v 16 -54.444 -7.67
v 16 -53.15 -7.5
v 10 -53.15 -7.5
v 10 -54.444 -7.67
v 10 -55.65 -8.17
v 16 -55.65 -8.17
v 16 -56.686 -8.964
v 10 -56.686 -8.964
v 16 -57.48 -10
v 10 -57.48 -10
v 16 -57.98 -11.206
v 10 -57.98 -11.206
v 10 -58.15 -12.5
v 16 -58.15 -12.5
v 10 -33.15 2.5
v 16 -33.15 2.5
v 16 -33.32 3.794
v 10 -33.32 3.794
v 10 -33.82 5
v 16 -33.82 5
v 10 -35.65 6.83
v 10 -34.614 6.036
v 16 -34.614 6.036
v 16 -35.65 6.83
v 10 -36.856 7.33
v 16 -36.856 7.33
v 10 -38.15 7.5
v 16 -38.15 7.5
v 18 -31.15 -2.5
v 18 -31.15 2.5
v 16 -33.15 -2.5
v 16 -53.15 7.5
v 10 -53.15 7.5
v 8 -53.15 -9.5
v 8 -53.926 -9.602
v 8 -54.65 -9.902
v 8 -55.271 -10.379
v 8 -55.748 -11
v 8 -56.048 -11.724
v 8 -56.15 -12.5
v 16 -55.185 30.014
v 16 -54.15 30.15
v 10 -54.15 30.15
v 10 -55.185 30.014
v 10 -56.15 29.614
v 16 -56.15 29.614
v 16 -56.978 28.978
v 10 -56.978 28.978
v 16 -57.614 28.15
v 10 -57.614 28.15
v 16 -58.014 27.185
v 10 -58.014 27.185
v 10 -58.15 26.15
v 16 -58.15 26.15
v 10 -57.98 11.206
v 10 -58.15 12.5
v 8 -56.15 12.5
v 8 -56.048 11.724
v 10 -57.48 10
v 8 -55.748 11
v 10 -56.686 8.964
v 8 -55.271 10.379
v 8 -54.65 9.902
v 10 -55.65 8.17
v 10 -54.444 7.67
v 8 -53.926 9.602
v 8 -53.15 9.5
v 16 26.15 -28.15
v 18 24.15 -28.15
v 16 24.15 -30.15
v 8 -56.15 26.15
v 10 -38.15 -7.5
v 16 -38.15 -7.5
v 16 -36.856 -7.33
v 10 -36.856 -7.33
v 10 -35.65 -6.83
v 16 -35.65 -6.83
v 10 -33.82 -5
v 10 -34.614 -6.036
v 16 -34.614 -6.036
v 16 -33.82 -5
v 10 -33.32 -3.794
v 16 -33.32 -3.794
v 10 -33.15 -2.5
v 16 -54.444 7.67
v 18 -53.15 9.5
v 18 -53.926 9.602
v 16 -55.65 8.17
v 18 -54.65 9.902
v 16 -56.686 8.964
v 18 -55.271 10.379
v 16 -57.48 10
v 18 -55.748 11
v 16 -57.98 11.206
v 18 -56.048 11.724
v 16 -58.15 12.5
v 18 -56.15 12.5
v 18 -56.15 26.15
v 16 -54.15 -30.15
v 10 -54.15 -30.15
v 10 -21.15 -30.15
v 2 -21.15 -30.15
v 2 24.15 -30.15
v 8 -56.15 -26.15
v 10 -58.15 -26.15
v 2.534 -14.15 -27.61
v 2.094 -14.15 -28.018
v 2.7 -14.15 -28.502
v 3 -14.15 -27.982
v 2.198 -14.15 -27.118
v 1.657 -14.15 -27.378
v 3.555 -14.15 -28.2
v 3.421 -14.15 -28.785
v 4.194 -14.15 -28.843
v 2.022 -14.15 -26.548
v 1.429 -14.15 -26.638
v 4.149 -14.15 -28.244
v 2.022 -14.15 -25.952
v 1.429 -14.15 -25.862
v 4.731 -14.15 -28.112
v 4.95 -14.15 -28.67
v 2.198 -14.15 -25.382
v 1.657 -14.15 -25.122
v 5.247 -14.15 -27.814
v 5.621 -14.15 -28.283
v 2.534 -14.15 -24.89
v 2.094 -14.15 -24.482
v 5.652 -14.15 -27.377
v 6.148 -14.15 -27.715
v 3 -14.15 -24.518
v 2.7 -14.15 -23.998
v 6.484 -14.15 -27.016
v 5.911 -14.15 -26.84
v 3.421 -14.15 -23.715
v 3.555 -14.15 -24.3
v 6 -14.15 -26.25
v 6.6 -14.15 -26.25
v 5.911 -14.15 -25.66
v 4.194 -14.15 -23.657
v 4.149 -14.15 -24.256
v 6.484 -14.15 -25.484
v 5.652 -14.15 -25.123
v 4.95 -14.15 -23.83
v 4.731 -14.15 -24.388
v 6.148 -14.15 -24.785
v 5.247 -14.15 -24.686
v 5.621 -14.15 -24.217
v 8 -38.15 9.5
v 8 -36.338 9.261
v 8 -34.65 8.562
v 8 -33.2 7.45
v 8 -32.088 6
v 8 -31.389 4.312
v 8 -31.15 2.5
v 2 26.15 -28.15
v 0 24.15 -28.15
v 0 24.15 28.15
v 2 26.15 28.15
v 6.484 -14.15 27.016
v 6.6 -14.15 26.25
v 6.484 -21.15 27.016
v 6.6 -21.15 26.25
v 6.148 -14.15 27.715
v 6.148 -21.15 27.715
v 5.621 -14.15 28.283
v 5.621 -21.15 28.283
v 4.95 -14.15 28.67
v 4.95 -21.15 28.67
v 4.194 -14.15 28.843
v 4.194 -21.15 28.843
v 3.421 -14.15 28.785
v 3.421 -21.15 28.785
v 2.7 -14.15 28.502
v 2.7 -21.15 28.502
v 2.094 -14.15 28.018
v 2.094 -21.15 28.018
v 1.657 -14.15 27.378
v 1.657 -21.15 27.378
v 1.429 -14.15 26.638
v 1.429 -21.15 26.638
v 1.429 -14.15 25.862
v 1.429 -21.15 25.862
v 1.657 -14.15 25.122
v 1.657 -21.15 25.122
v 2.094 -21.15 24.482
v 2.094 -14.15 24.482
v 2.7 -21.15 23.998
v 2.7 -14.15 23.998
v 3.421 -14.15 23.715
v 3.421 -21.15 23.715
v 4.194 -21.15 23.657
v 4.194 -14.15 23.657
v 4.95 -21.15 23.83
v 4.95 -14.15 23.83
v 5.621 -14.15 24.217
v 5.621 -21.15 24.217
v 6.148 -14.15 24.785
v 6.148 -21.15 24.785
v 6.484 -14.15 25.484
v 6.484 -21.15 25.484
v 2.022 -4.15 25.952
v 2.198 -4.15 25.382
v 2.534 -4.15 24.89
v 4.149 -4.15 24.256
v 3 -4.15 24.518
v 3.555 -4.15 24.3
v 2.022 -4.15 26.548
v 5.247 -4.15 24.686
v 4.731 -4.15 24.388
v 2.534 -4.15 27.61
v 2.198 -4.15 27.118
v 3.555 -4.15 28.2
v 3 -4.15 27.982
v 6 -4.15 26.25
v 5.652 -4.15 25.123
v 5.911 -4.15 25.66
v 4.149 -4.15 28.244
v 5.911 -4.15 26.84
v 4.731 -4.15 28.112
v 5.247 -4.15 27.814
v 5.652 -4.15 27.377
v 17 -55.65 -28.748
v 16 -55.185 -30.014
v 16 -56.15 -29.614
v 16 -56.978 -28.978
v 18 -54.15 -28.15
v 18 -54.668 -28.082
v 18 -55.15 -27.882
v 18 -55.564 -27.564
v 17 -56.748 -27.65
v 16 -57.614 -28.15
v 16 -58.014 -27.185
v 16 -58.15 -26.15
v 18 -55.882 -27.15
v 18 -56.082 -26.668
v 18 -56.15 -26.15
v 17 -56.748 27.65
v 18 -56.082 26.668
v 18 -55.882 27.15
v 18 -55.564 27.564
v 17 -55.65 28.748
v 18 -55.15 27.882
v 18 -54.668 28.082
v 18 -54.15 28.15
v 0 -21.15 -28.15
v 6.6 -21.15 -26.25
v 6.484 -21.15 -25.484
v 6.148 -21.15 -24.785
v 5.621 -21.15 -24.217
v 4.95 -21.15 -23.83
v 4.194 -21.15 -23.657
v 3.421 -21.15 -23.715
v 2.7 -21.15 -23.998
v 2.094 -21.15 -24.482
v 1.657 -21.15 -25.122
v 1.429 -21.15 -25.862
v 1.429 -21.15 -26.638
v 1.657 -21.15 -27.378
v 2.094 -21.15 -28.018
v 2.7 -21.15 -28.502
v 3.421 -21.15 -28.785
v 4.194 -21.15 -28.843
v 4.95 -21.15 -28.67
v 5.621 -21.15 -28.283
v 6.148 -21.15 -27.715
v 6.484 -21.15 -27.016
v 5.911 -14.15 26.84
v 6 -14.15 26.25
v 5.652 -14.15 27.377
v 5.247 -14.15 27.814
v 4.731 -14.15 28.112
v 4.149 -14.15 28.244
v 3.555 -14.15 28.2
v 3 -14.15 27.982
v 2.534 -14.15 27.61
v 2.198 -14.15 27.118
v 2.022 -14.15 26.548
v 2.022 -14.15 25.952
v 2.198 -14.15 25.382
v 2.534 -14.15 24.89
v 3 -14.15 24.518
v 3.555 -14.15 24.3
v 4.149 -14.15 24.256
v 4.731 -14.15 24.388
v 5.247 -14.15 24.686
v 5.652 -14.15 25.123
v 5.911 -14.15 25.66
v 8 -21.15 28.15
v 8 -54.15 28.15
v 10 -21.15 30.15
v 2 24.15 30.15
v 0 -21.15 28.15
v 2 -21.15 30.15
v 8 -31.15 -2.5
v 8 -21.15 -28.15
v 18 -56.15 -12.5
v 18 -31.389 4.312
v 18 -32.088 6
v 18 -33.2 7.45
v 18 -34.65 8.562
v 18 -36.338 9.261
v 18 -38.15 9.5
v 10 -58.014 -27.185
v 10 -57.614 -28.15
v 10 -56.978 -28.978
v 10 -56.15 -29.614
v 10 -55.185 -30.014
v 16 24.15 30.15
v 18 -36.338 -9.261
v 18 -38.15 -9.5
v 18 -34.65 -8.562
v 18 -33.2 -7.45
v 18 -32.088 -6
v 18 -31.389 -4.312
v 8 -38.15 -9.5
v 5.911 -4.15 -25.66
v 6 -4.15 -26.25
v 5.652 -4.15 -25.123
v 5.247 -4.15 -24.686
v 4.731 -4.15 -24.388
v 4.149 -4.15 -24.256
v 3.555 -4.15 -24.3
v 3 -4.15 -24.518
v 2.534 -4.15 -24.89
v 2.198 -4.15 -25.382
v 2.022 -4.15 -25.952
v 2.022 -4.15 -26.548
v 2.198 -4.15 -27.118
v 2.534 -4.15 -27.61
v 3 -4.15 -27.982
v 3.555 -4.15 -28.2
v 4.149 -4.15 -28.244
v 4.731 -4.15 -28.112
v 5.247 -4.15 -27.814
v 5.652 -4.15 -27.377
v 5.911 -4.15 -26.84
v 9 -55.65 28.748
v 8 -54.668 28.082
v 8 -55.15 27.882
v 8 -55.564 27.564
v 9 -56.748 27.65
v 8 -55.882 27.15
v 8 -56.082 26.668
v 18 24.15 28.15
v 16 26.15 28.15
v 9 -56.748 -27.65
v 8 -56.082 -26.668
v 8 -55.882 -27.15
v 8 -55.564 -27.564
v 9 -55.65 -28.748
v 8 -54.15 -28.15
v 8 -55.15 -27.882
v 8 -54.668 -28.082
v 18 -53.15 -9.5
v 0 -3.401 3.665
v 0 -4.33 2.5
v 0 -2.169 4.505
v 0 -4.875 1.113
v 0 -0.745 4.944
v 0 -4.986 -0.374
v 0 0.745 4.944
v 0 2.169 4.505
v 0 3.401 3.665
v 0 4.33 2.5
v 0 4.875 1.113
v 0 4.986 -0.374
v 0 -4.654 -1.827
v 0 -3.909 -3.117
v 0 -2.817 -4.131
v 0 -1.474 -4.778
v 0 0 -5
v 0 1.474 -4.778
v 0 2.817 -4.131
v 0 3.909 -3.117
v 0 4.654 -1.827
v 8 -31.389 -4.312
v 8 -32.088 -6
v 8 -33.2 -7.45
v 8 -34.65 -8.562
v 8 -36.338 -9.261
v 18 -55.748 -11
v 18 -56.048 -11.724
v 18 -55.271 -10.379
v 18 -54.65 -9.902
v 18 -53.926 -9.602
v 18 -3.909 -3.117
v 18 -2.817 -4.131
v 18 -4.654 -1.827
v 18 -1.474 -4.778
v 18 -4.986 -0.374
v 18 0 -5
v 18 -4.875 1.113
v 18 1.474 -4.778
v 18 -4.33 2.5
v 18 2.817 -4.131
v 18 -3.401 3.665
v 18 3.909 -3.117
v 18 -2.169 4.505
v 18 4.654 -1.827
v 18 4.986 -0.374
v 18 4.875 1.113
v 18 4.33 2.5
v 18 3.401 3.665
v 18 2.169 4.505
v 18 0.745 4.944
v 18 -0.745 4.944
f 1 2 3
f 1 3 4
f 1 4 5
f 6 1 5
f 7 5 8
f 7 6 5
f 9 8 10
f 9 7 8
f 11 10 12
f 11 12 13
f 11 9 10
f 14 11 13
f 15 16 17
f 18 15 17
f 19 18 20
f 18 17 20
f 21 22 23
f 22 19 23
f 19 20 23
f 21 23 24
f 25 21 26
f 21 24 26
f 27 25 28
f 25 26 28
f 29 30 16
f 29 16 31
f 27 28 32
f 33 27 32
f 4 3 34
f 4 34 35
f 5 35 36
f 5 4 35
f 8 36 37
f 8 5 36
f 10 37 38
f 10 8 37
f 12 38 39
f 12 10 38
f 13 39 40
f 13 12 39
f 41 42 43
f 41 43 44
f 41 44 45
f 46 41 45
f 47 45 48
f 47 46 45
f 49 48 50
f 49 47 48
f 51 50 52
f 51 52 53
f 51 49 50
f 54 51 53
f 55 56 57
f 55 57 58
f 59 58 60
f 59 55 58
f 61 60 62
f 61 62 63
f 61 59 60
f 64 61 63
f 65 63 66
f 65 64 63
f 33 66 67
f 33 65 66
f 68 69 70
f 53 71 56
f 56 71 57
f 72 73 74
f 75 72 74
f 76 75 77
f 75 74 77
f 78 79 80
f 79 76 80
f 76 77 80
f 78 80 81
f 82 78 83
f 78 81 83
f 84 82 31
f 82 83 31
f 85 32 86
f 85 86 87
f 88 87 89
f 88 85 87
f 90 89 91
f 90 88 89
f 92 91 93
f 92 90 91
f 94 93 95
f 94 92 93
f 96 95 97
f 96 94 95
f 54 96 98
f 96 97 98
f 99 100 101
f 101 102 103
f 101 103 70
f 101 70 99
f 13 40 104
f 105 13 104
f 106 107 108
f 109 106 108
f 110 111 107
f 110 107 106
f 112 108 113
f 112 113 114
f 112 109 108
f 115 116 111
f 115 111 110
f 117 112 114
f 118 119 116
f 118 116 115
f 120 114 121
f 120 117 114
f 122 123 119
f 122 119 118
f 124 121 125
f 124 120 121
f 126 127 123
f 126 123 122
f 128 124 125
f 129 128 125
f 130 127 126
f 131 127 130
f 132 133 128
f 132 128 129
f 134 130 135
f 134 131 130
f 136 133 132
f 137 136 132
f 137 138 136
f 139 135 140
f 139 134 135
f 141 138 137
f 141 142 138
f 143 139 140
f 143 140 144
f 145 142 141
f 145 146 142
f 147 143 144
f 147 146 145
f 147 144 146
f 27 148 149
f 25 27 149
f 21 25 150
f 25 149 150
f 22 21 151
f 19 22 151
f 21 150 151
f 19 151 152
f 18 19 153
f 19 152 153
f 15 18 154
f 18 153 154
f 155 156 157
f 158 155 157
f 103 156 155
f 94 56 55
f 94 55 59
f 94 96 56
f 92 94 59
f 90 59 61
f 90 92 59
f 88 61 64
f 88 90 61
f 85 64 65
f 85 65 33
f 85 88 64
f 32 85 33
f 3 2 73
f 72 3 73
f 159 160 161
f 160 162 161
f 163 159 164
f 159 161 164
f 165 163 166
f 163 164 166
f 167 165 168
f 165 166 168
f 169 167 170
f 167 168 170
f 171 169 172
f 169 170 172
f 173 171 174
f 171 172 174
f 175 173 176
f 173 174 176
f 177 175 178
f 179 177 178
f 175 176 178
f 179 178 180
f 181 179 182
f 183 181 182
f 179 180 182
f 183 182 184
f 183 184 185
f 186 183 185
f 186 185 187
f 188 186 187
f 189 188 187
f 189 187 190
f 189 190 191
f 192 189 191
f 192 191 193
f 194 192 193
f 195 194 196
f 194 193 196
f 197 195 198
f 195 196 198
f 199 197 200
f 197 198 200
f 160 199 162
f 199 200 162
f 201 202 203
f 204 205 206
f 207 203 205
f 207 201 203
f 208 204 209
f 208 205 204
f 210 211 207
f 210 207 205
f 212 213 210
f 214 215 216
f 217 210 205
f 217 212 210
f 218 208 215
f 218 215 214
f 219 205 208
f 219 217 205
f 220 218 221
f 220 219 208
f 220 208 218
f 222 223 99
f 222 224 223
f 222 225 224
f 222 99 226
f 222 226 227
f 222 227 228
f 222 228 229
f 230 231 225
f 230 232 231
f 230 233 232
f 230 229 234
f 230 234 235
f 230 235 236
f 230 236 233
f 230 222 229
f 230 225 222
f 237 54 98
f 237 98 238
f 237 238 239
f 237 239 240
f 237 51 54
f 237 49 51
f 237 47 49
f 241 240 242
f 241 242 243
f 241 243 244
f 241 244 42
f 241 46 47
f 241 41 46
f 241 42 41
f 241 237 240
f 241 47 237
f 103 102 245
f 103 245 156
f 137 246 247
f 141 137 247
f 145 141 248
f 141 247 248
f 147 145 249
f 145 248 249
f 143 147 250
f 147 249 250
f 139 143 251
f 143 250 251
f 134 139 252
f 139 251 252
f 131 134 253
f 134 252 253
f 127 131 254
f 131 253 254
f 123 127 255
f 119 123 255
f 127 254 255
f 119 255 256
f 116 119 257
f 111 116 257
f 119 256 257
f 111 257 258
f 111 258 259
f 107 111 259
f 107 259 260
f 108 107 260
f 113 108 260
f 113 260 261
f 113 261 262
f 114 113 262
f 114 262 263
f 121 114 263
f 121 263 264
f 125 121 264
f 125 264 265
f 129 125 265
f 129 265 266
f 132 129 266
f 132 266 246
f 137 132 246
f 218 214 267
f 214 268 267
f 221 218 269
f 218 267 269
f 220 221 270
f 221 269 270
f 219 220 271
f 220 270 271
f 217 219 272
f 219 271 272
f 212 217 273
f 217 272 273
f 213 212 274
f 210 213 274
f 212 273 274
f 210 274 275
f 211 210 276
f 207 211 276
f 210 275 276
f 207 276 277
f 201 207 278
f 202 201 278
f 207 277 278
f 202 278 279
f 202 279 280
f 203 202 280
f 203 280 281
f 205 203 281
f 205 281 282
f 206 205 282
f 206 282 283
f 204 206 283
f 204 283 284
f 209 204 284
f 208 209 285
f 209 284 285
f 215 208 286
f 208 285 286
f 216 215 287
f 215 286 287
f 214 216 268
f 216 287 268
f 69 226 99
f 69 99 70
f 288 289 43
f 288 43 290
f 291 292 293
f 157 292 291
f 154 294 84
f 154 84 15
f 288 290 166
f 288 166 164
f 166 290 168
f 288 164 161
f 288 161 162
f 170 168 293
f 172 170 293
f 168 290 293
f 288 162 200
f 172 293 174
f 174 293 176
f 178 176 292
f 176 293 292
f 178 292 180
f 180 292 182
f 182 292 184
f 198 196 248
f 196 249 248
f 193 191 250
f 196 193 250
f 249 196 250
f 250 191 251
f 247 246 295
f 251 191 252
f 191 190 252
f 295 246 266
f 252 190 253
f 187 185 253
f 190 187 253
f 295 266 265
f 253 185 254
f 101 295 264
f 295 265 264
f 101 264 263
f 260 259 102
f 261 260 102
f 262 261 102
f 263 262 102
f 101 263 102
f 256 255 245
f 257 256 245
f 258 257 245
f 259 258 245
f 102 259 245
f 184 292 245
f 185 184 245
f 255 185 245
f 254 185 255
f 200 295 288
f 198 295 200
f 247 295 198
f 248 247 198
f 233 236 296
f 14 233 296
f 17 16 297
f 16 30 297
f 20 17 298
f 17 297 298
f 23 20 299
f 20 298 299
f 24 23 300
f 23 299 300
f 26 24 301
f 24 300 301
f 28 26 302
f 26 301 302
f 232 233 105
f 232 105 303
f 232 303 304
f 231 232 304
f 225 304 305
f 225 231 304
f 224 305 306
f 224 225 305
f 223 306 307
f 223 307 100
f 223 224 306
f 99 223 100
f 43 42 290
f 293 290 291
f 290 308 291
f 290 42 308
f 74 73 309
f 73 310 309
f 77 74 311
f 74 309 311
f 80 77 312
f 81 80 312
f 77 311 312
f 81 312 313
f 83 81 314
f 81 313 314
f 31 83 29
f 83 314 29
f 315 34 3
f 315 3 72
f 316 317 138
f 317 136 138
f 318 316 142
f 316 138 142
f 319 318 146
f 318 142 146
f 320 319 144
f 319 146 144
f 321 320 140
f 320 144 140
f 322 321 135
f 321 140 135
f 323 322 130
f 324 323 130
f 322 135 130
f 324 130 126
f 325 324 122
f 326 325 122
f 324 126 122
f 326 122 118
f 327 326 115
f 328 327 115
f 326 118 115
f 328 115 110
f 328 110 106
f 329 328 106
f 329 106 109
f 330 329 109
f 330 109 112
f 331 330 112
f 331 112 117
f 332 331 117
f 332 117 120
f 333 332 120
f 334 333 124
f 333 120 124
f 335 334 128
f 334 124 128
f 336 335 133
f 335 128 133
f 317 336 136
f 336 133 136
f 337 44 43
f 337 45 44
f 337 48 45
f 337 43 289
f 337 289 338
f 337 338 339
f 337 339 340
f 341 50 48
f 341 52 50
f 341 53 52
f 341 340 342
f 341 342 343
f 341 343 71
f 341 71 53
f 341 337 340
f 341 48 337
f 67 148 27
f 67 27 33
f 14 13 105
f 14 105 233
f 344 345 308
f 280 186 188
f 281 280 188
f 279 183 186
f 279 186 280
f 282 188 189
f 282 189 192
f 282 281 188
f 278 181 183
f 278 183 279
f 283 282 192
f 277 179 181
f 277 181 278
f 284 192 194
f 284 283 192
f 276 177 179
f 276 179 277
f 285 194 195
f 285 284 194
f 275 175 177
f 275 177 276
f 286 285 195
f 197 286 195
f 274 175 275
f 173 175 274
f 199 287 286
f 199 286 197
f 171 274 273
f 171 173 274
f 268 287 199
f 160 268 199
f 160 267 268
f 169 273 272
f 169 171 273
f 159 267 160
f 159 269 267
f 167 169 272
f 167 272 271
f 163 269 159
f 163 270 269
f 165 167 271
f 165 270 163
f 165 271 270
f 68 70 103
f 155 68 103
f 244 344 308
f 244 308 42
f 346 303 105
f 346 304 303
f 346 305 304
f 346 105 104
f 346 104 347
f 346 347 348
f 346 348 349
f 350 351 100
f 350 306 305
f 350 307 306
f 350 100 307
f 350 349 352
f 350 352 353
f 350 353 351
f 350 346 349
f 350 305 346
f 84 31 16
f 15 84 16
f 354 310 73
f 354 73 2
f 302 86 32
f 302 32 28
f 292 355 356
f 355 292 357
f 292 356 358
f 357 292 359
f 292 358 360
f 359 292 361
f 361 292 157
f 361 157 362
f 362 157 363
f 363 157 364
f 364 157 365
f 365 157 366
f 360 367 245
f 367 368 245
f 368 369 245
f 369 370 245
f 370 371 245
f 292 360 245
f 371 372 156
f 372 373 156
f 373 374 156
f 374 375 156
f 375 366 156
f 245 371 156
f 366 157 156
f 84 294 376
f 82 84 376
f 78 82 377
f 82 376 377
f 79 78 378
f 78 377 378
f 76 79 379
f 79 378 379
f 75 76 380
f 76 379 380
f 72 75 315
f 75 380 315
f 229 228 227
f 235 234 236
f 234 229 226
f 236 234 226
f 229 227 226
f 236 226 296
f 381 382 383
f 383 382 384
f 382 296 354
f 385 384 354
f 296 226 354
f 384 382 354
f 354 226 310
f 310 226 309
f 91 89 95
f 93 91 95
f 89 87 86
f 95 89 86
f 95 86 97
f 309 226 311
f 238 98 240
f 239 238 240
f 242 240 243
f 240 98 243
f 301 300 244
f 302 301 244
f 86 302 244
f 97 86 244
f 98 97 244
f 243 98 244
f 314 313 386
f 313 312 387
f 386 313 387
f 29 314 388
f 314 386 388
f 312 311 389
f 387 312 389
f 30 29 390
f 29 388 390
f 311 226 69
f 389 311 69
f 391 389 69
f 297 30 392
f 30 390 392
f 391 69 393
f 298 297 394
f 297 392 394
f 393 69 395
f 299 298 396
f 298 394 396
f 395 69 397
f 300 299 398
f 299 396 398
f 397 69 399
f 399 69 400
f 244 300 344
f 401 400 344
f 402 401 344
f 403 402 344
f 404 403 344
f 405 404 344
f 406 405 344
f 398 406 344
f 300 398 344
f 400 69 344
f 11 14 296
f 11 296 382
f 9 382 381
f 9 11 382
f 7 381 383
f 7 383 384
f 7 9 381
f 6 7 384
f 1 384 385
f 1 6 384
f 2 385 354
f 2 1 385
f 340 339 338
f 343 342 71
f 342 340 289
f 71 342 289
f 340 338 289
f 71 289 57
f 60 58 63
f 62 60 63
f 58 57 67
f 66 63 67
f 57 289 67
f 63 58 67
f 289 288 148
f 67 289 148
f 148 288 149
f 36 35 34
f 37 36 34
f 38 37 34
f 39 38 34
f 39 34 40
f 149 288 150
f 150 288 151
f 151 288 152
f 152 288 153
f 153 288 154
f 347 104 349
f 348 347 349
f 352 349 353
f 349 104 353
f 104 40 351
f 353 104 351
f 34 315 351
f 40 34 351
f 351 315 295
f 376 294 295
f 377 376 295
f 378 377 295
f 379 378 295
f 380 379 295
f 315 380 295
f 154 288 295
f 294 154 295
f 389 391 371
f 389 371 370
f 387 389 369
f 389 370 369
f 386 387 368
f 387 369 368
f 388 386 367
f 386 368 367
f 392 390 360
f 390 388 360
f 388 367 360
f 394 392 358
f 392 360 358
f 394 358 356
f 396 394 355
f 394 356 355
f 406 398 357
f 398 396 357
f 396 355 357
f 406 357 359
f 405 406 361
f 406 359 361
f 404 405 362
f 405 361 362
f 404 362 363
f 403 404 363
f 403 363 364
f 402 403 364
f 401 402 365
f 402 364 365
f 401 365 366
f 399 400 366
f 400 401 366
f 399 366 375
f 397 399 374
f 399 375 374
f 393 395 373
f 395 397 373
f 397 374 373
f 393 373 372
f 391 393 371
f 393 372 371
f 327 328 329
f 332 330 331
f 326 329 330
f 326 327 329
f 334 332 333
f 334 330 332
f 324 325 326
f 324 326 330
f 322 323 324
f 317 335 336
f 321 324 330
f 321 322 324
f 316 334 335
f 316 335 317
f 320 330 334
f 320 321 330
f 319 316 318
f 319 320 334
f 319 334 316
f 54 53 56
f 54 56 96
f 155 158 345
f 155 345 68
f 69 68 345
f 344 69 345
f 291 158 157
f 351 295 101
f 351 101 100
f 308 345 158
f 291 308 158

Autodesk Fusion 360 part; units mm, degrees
sketch "Sketch1" plane through (0, 0, 0) normal (1, 0, 0) x (0, 0, -1)
  circle A0 centre (0, 0) radius 5
  line L0 (-30.15, -21.15) -> (30.15, -21.15)
  line L1 (30.15, -21.15) -> (30.15, 21.15)
  line L2 (-30.15, -21.15) -> (-30.15, 26.15)
  line L3 (-30.15, 26.15) -> (30.15, 26.15)
  line L4 (30.15, 26.15) -> (30.15, 21.15)
  dimension "d11" = 10
  dimension "d127" = 60.3
  dimension "d142" = 21.15
  dimension "d143" = 30.15
extrude "Extrude1" add sketch "Sketch1" along normal blind 8
sketch "Sketch16" plane through (0, -21.15, 0) normal (0, -1, 0) x (1, 0, 0)
  line L0 (0, 30.15) -> (0, -30.15)
  line L1 (0, -30.15) -> (8, -30.15)
  line L2 (8, -30.15) -> (8, 30.15)
  line L3 (8, 30.15) -> (0, 30.15)
  line L4 (4, 26.25) -> (4, -26.25) construction
  circle A0 centre (4, 26.25) radius 2.6
  circle A1 centre (4, -26.25) radius 2.6
  dimension "d144" = 4
  dimension "d145" = 52.5
  dimension "d146" = 5.2
  dimension "d147" = 5.2
  dimension "d148" = 26.25
extrude "Extrude17" cut sketch "Sketch16" against normal blind 7 contours A0 | A1
sketch "Sketch17" plane through (0, -14.15, 0) normal (0, -1, 0) x (1, 0, 0)
  circle A0 centre (4, 26.25) radius 2.6
  line L0 (4, 26.25) -> (4, -26.25)
  circle A1 centre (4, 26.25) radius 2
  circle A2 centre (4, -26.25) radius 2
  dimension "d151" = 52.5
  dimension "d152" = 4
  dimension "d153" = 4
extrude "Extrude18" cut sketch "Sketch17" against normal blind 10 contours A1 | A2
extrude "Extrude19" add 1 faces at (8, 1.9151, -21.7481) along direction (1, 0, 0) blind 10
sketch "Sketch18" plane through (0, -21.15, 0) normal (0, -1, 0) x (1, 0, 0)
  circle A0 centre (4, 26.25) radius 2.6
  circle A1 centre (4, -26.25) radius 2.6
  line L0 (0, 30.15) -> (0, -30.15)
  line L1 (0, -30.15) -> (18, -30.15)
  line L2 (18, -30.15) -> (18, 30.15)
  line L3 (18, 30.15) -> (0, 30.15)
  line L4 (18, 30.15) -> (8, 30.15)
  line L5 (8, 30.15) -> (8, -30.15)
  line L6 (8, -30.15) -> (18, -30.15)
  line L7 (18, -30.15) -> (18, 30.15)
  dimension "d159" = 10
extrude "Extrude20" add sketch "Sketch18" along normal blind 37 contours L1 L2 L3 L4 L5 L6 L7
sketch "Sketch19" plane through (18, 0, 0) normal (1, 0, 0) x (0, 0, -1)
  circle A0 centre (0, 0) radius 5
  line L0 (30.15, -58.15) -> (30.15, 26.15)
  line L1 (30.15, 26.15) -> (-30.15, 26.15)
  line L2 (-30.15, 26.15) -> (-30.15, -58.15)
  line L3 (-7.5, -58.15) -> (7.5, -58.15)
  line L4 (7.5, -53.15) -> (7.5, -38.15)
  line L5 (2.5, -33.15) -> (-2.5, -33.15)
  line L6 (-7.5, -38.15) -> (-7.5, -53.15)
  line L7 (12.5, -58.15) -> (26.15, -58.15)
  line L8 (30.15, -54.15) -> (30.15, 26.15)
  line L9 (30.15, 26.15) -> (-30.15, 26.15)
  line L10 (-30.15, 26.15) -> (-30.15, -54.15)
  arc A1 (-2.5, -33.15) -> (-7.5, -38.15) centre (-2.5, -38.15) ccw
  arc A2 (7.5, -38.15) -> (2.5, -33.15) centre (2.5, -38.15) ccw
  arc A3 (7.5, -53.15) -> (12.5, -58.15) centre (12.5, -53.15) ccw
  line L11 (-26.15, -58.15) -> (-12.5, -58.15)
  arc A4 (-12.5, -58.15) -> (-7.5, -53.15) centre (-12.5, -53.15) ccw
  line L12 (30.15, -58.15) -> (-30.15, -58.15)
  arc A5 (-30.15, -54.15) -> (-26.15, -58.15) centre (-26.15, -54.15) ccw
  arc A6 (26.15, -58.15) -> (30.15, -54.15) centre (26.15, -54.15) ccw
  dimension "d162" = 15
  dimension "d163" = 25
  dimension "d164" = 7.5
  dimension "d165" = 5
  dimension "d166" = 5
  dimension "d167" = 4
  dimension "d168" = 4
extrude "Extrude21" cut sketch "Sketch19" against normal up to surface (10 mm away) contours L0 L12 A6 | L3 L4 L5 L6 A1 A2 A3 A4 L12 | L2 L12 A5
chamfer "Chamfer1" distance 2 angle 45 32 edges at (18, 26.15, 0) (9, 26.15, 30.15) (0, 26.15, 0) (0, 2.5, 30.15) (18, -14, 30.15) (18, -56.9784, 28.9784) (18, -58.15, 19.325) (18, -56.6855, 8.9645) (18, -45.65, 7.5) (18, -34.6145, 6.0355) (18, -33.15, 0) (18, -34.6145, -6.0355) (18, -45.65, -7.5) (18, -56.6855, -8.9645) (18, -58.15, -19.325) (18, -56.9784, -28.9784) (18, -14, -30.15) (8, -37.65, 30.15) (8, -56.9784, 28.9784) (8, -58.15, 19.325) (8, -56.6855, 8.9645) (8, -45.65, 7.5) (8, -34.6145, 6.0355) (8, -33.15, 0) (8, -34.6145, -6.0355) (8, -45.65, -7.5) (8, -56.6855, -8.9645) (8, -58.15, -19.325) (8, -56.9784, -28.9784) (8, -37.65, -30.15) (0, 2.5, -30.15) (9, 26.15, -30.15)
equation "d143 = ( 60.3 / 2 ) * 1 mm"
equation "d148 = ( 52.5 / 2 ) * 1 mm"
